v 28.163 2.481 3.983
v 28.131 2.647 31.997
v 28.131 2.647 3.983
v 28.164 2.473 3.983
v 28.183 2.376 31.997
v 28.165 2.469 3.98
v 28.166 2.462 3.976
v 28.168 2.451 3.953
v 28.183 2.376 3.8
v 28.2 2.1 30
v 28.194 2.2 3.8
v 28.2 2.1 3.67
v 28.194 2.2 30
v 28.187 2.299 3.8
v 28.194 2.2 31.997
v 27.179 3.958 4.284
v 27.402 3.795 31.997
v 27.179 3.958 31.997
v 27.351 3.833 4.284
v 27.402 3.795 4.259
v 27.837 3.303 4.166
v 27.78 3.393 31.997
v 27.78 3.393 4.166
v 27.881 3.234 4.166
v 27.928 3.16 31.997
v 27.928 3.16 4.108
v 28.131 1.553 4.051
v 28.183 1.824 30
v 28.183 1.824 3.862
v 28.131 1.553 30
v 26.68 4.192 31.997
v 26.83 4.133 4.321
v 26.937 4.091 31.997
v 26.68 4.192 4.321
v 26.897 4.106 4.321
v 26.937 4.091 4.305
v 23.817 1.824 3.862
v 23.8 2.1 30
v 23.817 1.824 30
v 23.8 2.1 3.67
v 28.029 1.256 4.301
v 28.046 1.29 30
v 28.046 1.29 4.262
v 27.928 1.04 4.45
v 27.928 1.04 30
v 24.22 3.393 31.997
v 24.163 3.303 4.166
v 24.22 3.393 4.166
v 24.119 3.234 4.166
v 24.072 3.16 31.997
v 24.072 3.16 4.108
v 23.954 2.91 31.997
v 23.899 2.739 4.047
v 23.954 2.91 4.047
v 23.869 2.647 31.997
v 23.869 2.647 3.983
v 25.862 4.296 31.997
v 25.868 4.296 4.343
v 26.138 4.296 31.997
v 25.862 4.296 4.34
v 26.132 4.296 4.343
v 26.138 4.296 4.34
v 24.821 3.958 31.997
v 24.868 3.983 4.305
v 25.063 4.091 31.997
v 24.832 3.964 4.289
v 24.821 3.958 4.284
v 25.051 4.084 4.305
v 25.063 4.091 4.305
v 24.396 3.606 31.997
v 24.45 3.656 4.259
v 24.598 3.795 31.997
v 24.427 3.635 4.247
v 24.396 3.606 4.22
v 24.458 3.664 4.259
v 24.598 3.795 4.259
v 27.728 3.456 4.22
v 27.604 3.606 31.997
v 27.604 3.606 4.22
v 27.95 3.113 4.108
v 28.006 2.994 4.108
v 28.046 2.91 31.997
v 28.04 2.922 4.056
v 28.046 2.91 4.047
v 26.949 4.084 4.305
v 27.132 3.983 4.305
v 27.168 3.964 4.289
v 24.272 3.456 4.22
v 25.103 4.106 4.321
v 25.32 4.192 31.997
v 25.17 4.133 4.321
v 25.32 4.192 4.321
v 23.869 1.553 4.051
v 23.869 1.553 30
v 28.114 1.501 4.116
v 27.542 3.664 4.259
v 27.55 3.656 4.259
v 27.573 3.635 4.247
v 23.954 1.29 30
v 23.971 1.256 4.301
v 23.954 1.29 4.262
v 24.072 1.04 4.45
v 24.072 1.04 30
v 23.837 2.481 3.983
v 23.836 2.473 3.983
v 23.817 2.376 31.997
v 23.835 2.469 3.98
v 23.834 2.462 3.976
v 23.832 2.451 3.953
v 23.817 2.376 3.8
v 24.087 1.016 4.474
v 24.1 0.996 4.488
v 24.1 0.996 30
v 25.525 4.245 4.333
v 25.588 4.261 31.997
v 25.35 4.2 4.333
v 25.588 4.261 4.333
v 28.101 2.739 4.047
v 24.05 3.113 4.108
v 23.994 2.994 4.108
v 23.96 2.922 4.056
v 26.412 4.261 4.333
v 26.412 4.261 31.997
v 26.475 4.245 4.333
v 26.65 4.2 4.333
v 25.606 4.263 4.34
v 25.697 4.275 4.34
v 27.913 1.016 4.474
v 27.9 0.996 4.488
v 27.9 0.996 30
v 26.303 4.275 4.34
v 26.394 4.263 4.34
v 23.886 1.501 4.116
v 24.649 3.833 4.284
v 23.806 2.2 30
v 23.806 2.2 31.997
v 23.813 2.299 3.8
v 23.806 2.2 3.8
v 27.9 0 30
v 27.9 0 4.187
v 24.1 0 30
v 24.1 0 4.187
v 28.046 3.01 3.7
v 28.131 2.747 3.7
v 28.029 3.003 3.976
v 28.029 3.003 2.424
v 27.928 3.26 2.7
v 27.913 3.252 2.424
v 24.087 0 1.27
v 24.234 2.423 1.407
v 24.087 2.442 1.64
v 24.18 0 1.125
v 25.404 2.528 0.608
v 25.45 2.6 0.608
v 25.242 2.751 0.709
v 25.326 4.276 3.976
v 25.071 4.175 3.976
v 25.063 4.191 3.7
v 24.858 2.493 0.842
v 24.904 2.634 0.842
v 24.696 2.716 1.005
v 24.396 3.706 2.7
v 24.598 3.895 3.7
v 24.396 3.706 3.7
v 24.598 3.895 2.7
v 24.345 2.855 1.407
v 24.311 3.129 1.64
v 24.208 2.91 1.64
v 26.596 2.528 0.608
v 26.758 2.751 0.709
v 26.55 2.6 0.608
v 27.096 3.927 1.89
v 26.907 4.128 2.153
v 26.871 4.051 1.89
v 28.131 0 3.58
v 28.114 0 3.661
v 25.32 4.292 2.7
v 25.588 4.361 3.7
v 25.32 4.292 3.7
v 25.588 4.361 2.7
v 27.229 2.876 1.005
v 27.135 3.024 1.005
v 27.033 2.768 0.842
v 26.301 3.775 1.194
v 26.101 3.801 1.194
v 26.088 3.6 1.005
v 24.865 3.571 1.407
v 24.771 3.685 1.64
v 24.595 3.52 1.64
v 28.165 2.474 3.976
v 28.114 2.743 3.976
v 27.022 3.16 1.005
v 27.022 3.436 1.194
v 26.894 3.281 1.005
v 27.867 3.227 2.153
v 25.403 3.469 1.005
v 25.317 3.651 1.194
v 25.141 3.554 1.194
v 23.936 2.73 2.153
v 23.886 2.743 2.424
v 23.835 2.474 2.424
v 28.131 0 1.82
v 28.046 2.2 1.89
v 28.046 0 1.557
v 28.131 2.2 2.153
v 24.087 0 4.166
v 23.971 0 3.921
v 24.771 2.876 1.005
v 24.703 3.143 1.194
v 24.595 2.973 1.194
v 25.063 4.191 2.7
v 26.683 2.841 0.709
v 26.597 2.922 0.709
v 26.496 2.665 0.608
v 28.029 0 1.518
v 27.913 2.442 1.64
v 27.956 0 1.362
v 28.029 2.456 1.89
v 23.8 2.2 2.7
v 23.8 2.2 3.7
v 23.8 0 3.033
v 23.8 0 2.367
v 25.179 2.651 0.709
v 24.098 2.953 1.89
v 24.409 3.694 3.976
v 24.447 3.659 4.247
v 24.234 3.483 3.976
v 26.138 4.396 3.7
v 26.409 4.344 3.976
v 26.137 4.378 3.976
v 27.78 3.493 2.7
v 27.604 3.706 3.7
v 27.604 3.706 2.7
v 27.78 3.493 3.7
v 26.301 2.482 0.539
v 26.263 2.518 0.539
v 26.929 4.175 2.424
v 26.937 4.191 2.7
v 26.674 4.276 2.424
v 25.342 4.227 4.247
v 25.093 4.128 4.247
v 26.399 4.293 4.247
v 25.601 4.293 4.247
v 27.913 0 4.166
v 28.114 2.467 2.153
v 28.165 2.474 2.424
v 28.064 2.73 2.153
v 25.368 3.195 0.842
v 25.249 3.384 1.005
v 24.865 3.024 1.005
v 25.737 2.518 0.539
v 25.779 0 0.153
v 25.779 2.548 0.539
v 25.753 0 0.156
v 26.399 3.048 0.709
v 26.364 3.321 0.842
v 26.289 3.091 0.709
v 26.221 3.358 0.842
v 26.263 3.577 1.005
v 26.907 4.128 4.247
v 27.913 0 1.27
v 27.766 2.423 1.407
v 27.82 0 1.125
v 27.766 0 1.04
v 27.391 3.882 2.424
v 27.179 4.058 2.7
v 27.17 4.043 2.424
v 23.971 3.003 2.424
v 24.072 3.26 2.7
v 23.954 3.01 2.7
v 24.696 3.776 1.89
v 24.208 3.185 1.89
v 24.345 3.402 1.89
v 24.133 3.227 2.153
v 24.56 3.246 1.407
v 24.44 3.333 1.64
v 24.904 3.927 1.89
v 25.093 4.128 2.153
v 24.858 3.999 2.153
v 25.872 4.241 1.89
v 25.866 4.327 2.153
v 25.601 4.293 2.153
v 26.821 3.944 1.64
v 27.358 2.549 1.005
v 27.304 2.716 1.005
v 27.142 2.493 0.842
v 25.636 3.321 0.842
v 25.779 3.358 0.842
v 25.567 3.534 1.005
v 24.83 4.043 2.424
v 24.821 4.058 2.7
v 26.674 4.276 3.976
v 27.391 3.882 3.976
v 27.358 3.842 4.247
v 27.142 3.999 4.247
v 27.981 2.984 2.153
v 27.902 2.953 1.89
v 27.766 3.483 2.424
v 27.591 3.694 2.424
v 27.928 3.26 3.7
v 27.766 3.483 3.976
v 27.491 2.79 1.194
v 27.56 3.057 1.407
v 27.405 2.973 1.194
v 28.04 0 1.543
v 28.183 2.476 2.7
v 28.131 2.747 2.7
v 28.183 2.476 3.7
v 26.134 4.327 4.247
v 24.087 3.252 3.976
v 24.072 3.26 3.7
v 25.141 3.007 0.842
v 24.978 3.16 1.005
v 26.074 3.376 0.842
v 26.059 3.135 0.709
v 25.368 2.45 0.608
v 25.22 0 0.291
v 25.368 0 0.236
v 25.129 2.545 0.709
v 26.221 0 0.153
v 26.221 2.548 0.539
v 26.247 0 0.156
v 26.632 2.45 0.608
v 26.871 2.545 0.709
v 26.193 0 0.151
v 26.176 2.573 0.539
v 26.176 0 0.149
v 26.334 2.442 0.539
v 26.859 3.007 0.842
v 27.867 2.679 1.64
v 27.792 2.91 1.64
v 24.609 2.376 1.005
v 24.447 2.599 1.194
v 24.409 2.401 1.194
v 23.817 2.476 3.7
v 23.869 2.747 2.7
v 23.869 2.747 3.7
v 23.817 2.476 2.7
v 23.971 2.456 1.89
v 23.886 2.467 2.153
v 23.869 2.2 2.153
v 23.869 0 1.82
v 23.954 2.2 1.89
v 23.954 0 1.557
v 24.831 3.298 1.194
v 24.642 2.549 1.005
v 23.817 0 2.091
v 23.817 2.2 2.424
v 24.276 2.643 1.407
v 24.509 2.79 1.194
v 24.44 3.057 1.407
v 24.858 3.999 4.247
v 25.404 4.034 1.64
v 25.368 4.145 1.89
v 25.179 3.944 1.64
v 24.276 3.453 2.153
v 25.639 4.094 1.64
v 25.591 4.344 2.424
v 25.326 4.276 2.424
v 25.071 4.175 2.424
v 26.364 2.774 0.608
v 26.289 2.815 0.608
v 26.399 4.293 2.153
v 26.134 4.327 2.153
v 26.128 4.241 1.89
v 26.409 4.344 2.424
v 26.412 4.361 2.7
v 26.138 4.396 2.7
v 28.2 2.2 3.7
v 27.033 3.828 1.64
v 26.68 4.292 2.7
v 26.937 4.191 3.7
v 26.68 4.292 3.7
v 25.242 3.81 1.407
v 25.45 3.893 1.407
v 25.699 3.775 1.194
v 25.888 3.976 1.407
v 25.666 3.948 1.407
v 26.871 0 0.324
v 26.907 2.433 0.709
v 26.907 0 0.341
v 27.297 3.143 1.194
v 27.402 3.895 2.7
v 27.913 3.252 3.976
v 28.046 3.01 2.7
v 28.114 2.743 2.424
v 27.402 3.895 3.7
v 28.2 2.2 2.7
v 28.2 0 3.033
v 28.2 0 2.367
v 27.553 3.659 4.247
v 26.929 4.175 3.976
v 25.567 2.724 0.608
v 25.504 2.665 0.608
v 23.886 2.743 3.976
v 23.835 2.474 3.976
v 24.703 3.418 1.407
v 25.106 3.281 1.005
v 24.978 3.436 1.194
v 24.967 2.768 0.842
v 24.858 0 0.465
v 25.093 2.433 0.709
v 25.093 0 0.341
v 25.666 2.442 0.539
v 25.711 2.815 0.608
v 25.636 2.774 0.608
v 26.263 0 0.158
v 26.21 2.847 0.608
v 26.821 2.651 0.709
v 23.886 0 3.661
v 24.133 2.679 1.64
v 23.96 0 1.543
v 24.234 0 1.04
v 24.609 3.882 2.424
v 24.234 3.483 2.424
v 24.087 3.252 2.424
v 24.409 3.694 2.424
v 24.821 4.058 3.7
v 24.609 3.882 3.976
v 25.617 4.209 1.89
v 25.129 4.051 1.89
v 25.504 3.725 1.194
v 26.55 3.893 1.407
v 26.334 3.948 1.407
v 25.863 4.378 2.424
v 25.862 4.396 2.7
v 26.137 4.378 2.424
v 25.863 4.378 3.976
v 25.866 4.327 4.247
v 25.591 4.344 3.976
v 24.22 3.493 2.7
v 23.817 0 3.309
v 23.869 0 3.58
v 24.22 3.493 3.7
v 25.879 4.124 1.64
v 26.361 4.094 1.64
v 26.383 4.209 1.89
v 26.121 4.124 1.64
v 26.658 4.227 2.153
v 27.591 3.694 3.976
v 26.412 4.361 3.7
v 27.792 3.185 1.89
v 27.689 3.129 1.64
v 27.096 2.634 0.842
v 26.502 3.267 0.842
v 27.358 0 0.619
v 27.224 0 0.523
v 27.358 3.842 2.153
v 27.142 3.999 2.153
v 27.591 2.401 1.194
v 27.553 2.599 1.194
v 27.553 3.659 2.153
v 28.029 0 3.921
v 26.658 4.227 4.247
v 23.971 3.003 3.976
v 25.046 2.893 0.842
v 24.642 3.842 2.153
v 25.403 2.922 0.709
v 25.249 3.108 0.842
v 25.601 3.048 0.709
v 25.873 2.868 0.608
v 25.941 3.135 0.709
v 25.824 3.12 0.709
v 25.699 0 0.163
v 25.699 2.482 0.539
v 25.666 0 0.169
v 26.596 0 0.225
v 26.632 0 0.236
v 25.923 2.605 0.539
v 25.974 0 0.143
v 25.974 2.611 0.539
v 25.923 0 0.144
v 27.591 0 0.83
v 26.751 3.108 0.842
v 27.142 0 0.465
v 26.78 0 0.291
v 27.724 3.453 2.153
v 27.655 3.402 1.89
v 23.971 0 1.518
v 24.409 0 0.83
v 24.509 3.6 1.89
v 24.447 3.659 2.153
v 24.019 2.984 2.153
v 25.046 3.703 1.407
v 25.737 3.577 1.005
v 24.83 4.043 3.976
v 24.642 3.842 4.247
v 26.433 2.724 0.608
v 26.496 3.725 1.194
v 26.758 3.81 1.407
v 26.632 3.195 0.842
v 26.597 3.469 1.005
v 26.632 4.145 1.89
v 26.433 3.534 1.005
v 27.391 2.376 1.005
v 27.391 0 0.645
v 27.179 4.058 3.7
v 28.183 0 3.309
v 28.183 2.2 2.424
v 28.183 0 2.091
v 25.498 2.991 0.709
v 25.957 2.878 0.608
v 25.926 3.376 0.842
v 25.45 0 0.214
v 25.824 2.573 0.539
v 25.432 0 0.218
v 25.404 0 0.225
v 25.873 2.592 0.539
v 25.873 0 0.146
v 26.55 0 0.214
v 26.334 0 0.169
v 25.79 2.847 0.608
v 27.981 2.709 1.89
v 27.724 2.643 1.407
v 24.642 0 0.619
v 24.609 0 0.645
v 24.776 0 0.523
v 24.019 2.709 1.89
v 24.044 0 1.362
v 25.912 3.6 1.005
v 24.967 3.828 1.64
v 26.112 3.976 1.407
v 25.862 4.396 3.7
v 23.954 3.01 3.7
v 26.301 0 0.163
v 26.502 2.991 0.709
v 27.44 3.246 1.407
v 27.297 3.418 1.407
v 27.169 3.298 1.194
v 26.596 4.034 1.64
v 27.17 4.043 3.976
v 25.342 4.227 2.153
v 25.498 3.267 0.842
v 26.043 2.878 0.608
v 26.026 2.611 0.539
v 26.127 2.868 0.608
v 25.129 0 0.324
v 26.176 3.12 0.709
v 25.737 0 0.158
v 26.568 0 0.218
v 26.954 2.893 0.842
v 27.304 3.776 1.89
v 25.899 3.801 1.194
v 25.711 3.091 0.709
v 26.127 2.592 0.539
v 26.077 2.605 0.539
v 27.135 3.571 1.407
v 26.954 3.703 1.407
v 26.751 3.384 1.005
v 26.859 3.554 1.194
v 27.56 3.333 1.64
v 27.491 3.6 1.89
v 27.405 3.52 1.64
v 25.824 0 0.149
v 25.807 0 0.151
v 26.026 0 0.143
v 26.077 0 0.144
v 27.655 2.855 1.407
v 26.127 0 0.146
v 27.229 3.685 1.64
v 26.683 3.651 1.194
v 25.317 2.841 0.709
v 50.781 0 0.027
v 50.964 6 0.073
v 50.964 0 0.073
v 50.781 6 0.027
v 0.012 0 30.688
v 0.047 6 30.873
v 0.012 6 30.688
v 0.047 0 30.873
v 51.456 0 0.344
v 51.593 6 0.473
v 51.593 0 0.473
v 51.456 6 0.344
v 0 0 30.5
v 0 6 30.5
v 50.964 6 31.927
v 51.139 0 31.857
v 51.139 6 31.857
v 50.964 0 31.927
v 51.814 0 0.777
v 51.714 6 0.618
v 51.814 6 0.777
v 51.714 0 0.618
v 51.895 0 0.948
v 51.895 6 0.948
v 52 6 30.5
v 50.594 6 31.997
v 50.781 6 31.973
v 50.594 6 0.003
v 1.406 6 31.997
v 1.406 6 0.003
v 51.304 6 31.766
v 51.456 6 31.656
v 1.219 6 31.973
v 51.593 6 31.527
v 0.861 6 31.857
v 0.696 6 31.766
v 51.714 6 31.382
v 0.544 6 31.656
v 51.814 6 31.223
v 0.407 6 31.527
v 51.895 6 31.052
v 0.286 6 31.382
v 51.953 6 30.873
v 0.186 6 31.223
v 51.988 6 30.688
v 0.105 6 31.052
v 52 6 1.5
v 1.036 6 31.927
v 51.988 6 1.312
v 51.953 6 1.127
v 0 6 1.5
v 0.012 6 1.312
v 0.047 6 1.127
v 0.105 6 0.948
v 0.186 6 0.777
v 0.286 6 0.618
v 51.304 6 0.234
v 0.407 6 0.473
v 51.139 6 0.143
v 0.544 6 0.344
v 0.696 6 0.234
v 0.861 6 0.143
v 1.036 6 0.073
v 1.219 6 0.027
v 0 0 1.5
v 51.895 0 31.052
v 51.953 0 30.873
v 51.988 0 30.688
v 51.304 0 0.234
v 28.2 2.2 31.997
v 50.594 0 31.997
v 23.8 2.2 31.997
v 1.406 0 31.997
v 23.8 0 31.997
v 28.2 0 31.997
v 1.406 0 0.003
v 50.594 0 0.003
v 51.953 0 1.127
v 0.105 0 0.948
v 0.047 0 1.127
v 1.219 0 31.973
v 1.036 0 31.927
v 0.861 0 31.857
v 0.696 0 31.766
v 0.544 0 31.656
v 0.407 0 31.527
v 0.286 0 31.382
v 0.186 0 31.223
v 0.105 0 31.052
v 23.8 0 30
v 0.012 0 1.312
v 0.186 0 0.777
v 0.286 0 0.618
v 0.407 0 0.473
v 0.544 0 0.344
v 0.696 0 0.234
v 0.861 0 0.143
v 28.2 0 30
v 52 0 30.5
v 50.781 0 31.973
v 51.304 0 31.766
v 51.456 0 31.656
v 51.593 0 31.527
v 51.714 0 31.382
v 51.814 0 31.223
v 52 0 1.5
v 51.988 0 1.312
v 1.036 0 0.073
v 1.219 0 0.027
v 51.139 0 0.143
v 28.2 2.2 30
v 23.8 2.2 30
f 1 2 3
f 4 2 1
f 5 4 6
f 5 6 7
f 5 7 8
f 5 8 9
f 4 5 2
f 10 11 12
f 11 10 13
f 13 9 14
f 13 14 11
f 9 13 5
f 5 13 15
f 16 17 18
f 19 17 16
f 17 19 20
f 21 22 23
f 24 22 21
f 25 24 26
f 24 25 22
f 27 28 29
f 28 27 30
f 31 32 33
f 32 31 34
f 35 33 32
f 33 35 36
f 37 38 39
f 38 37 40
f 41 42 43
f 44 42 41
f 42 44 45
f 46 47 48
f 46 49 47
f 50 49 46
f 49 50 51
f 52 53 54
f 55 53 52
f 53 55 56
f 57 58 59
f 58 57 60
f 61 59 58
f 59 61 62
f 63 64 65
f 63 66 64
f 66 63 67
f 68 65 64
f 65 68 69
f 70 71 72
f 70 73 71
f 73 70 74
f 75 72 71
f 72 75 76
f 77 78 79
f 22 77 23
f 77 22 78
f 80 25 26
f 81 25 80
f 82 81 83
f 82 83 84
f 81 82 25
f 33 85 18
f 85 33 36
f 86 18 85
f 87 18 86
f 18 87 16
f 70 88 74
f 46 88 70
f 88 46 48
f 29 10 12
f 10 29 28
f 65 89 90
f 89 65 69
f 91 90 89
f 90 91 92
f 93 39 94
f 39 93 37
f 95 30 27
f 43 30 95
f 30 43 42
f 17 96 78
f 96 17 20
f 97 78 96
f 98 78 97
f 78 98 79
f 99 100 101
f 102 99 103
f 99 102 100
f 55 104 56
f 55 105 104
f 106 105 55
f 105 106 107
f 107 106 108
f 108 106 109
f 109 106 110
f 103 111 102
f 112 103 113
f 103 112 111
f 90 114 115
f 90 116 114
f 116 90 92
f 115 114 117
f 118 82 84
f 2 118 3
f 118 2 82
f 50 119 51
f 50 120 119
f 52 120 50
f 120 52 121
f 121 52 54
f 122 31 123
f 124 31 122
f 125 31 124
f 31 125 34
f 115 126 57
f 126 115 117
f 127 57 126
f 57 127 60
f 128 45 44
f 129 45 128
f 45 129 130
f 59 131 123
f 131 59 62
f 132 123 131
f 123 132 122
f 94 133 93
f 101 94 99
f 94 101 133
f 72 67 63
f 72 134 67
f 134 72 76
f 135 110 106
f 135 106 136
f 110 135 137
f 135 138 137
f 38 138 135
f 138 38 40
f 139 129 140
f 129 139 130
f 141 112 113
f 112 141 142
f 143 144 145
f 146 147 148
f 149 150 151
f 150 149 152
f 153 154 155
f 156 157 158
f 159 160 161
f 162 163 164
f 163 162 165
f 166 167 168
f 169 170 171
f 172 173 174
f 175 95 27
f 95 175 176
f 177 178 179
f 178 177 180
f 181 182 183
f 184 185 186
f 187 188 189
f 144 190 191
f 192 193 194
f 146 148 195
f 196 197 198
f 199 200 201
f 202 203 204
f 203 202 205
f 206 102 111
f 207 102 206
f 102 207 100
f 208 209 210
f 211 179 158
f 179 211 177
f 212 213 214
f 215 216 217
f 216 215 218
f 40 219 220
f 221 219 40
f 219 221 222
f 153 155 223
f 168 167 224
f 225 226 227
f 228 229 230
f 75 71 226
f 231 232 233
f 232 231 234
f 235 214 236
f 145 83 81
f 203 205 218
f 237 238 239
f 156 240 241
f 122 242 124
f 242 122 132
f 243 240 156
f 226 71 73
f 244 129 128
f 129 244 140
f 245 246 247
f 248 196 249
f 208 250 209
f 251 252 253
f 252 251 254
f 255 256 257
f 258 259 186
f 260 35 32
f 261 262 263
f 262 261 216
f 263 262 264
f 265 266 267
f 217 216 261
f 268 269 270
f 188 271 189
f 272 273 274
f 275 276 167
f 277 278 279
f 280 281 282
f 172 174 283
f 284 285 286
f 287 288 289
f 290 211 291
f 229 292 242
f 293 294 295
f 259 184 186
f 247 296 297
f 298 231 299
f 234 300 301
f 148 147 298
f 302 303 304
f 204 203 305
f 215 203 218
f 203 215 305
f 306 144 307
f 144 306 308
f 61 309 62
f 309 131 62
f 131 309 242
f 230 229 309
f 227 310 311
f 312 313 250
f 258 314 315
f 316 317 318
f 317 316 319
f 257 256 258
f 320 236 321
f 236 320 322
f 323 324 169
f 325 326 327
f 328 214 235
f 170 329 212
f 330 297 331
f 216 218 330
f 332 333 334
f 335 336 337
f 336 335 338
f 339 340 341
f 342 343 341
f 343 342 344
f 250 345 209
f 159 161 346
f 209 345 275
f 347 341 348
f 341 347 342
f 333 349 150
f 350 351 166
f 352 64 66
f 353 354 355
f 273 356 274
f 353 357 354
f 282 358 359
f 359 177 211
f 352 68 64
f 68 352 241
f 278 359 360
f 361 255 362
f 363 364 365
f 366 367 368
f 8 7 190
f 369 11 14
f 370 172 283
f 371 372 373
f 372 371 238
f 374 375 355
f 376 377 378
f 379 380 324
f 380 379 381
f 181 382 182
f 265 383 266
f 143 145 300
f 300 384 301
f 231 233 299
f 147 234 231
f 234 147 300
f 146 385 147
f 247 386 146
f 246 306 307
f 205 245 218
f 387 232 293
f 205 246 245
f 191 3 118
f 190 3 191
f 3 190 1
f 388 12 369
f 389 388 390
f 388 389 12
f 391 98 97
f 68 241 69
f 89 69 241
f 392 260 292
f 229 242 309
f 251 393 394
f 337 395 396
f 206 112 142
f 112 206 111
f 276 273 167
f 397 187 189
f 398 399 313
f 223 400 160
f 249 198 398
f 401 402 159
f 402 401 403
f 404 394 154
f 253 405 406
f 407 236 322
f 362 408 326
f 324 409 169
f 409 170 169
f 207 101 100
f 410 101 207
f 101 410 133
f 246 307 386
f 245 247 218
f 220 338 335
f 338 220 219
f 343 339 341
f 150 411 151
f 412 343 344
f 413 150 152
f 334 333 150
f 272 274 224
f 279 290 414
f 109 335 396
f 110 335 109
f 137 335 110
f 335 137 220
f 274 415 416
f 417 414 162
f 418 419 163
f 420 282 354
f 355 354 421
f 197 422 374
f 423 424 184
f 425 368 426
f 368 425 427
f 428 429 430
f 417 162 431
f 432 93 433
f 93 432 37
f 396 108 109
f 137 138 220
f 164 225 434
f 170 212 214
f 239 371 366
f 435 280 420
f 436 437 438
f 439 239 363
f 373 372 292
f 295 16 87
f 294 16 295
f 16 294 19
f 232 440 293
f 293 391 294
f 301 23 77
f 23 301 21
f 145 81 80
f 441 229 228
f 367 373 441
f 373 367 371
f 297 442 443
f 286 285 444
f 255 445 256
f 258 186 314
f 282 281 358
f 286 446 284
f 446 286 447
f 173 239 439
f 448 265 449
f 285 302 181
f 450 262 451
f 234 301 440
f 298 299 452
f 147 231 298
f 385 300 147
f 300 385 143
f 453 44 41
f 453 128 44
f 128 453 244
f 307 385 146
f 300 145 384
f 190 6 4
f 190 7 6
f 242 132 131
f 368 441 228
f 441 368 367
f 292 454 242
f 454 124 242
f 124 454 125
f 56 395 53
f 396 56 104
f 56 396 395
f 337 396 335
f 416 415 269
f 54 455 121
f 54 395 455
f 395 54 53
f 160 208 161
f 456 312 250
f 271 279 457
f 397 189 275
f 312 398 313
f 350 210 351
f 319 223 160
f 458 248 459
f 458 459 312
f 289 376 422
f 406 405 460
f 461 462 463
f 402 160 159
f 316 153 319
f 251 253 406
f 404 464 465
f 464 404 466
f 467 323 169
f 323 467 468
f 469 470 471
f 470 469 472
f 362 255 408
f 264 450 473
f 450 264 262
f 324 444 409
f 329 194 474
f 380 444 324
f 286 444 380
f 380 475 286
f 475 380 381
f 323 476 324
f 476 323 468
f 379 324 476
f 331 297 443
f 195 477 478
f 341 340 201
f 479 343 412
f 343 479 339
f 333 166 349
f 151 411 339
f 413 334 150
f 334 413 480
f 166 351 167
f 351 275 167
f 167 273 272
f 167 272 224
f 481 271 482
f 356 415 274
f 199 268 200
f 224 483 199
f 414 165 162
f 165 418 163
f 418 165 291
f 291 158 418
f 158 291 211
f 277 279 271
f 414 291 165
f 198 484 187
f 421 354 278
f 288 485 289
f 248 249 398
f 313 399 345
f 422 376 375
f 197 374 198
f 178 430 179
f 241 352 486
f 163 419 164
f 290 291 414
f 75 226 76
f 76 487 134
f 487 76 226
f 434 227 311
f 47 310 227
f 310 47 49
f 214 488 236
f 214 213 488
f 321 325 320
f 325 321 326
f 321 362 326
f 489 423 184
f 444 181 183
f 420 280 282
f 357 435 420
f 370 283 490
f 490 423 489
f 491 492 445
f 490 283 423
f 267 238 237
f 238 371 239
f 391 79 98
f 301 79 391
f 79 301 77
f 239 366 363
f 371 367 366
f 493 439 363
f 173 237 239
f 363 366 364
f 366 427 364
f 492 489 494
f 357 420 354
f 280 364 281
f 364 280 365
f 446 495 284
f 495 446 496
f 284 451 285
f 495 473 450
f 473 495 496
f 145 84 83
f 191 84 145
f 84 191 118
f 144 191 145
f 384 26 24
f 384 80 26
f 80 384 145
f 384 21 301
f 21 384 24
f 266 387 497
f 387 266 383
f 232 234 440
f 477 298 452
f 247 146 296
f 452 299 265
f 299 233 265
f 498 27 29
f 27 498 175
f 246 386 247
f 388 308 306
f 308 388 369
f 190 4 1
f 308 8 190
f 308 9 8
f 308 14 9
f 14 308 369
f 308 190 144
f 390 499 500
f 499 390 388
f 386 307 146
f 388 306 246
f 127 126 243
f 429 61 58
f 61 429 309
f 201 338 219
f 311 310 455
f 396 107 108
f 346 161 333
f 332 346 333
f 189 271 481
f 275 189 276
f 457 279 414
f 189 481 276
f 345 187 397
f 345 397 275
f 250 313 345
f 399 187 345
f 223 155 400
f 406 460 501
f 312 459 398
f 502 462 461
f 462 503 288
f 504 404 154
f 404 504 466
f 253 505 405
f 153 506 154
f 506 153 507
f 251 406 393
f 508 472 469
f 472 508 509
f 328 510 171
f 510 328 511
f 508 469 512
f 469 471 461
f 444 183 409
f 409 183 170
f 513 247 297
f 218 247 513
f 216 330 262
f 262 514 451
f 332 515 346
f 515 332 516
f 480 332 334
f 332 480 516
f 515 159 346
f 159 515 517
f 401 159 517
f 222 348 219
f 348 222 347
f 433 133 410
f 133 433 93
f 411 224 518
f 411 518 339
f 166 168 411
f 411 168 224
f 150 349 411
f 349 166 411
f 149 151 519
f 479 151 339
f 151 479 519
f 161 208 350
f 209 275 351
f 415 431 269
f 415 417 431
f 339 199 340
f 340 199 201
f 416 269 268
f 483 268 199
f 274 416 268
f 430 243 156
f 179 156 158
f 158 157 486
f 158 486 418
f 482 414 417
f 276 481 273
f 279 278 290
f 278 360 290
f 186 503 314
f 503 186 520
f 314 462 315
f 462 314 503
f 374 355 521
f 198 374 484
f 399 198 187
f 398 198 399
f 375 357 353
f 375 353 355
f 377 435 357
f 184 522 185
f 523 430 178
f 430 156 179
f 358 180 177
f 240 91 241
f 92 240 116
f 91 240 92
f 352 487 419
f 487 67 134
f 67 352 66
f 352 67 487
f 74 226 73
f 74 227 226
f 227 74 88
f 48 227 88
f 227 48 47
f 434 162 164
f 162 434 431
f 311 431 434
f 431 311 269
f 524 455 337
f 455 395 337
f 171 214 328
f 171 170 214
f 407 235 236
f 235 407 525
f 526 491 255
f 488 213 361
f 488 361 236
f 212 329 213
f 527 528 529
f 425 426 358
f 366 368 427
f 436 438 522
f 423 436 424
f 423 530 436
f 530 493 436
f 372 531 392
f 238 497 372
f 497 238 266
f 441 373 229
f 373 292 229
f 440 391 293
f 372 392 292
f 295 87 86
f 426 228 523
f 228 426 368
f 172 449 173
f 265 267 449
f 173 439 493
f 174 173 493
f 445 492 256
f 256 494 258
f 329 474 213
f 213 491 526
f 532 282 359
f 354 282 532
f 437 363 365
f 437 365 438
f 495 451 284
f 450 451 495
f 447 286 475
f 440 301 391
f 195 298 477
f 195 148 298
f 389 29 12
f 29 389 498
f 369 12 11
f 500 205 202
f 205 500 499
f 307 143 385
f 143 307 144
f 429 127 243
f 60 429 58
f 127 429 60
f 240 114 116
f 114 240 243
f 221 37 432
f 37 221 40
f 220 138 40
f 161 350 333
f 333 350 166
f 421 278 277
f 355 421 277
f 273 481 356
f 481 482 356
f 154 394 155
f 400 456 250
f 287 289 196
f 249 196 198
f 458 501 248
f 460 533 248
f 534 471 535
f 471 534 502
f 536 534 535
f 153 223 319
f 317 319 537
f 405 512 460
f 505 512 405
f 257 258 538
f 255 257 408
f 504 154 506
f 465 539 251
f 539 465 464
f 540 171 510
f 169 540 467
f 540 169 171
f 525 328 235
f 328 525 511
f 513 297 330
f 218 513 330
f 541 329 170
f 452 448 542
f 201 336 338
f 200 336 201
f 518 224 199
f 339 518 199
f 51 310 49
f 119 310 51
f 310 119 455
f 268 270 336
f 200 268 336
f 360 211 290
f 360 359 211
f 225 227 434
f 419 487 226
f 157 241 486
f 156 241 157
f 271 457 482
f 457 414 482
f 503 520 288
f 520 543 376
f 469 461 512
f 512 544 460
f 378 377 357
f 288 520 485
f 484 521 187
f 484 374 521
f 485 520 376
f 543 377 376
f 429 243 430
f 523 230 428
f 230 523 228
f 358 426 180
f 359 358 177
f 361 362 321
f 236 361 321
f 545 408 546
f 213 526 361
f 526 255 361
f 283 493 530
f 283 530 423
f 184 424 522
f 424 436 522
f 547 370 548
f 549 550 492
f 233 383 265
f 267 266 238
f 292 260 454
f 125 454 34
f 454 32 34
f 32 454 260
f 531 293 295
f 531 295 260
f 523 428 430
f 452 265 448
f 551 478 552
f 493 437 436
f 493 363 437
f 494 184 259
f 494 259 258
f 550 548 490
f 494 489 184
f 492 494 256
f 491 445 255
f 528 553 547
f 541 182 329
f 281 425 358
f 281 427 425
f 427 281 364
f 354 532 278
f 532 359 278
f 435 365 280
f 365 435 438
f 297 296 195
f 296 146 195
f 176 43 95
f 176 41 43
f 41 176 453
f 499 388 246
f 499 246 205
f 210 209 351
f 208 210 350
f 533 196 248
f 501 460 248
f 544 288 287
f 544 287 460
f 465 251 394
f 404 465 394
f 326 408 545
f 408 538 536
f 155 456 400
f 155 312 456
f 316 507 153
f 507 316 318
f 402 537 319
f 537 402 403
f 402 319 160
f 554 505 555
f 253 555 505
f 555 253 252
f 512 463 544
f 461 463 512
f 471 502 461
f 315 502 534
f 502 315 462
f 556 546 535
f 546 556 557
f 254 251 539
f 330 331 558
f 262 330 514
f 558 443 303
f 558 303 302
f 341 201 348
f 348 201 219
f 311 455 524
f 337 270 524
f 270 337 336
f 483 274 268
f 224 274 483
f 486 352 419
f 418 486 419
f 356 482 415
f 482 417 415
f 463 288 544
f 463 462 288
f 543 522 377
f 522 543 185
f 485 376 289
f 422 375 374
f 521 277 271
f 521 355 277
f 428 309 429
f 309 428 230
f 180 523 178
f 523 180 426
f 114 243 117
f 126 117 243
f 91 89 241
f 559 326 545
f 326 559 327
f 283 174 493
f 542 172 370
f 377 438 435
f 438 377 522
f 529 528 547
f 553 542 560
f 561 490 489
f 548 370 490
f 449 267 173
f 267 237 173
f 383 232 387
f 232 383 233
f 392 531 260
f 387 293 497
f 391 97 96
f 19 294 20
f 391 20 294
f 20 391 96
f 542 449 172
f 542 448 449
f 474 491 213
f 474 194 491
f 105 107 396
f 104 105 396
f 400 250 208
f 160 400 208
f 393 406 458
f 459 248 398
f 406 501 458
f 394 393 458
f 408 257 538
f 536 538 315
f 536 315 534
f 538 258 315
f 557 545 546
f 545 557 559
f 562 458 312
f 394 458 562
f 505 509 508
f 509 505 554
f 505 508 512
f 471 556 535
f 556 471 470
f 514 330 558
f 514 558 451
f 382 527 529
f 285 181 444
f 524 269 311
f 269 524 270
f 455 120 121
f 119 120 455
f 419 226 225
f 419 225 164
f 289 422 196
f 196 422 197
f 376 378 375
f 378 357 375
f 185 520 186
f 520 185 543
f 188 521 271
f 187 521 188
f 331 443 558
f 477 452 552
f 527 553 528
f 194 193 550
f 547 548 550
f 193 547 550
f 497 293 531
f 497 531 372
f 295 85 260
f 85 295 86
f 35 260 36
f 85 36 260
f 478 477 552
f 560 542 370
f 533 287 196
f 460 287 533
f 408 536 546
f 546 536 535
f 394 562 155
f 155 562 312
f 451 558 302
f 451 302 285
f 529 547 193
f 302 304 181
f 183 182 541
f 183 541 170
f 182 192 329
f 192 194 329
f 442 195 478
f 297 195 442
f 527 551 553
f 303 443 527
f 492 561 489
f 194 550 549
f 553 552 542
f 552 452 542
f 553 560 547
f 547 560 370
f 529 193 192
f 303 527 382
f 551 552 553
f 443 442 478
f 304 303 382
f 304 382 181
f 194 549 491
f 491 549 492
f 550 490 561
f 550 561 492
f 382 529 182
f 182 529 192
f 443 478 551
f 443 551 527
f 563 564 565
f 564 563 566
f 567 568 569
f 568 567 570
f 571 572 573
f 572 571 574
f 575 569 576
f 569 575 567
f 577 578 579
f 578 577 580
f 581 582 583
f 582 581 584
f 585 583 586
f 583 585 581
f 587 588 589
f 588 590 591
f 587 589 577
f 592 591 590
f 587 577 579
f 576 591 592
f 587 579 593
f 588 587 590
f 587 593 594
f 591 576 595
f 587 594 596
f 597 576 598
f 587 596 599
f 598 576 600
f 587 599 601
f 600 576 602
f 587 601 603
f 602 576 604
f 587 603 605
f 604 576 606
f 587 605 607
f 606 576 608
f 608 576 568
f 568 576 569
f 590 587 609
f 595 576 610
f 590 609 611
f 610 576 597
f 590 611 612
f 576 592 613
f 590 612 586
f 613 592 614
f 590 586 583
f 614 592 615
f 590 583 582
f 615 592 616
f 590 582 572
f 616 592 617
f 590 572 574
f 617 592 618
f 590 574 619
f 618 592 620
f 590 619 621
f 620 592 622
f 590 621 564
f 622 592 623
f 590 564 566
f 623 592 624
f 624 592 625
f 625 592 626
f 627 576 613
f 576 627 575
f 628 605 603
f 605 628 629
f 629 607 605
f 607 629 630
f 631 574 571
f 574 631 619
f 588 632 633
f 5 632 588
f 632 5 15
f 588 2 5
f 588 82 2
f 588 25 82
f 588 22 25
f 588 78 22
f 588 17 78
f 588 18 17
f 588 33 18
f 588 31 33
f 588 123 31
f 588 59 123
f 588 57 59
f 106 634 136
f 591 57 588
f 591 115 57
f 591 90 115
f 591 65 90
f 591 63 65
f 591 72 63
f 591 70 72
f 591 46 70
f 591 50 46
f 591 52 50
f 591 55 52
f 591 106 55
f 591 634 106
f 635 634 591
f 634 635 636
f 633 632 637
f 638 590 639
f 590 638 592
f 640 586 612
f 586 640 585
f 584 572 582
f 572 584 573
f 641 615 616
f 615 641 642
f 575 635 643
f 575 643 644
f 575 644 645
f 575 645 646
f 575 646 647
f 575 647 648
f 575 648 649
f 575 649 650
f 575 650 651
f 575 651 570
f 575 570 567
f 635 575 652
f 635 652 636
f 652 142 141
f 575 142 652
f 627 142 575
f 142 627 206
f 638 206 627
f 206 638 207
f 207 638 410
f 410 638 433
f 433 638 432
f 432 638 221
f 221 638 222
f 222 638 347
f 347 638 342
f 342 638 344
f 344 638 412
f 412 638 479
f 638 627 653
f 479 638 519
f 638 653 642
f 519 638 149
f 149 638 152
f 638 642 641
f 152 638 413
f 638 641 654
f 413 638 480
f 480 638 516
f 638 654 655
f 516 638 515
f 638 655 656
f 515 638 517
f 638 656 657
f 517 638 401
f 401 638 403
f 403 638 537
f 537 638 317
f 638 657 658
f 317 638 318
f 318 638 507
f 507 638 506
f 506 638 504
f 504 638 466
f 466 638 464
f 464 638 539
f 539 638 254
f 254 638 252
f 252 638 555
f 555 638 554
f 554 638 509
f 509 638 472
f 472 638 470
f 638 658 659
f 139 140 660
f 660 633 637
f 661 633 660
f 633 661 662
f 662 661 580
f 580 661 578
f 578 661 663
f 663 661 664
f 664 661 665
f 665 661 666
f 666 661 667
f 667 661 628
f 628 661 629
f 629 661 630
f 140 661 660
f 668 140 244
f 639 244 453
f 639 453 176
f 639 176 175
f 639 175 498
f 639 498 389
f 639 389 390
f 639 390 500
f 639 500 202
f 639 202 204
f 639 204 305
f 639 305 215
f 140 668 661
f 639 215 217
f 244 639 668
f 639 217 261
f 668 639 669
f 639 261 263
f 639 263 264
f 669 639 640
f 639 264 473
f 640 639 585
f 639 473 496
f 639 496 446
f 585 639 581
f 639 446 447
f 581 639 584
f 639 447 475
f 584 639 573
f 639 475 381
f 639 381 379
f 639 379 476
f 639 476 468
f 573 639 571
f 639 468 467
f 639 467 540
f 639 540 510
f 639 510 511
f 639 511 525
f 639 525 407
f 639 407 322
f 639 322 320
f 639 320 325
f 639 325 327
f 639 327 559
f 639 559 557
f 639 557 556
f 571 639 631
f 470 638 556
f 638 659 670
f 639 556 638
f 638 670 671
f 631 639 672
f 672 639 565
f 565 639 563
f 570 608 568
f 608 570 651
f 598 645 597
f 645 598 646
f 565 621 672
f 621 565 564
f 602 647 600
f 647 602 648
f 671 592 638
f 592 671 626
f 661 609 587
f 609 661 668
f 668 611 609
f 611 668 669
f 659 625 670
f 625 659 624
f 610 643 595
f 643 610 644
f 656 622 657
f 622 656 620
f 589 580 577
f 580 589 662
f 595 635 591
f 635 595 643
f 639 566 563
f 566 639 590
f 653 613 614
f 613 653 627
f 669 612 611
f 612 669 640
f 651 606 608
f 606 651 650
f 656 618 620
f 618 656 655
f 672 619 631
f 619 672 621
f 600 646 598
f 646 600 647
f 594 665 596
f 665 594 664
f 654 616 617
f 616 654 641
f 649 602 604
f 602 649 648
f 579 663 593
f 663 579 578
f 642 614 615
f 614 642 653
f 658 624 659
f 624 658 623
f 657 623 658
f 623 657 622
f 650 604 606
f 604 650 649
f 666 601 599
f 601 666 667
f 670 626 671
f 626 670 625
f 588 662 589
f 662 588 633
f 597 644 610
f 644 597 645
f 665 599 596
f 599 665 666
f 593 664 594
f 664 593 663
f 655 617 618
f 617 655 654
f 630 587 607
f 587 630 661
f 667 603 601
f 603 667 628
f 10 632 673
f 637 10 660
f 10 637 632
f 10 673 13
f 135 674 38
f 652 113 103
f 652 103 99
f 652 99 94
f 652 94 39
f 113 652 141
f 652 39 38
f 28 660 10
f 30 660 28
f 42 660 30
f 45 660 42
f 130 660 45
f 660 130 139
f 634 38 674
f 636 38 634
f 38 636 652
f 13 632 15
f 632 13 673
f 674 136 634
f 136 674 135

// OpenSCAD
// SKADIS large hook label

// Recommend adding 2 mm to label width
Width = 52;
// Recommend adding 2 mm to label height
Height = 32;
// Corner radius
Radius = 1.5;
// Thickness in addition to the wire size
Thickness = 1;
// Thickness of the IKEA wire clip
WireDia = 4.4;
// Clip overlap determines how tight it is to push the clip on
ClipOverlap = 0.6;

$fn = 50;

assert(Radius < Width/2);
assert(Radius < Height/2);

t = Thickness + WireDia + ClipOverlap;


difference() {
  // Plate
  if (Radius < 0.1) {
    cube([Width, t, Height]);
  } else {
    translate([0,t,0]) rotate([90,0,0]) hull() {
      translate([Radius, Radius, 0]) cylinder(r=Radius, h=t);
      translate([Width-Radius, Radius, 0]) cylinder(r=Radius, h=t);
      translate([Width-Radius, Height-Radius, 0]) cylinder(r=Radius, h=t);
      translate([Radius, Height-Radius, 0]) cylinder(r=Radius, h=t);
    }
  }
  translate([0,0,0.5]) { // Push down from top
    // Main Wire
    translate([Width/2,WireDia/2 - 0.1, WireDia/2]) cylinder(d=WireDia, h=Height);
    w = WireDia - ClipOverlap;
    // Cutout to let wire push in
    translate([Width/2 - w/2, -WireDia/2, WireDia/2]) cube([w, WireDia, Height+2]);
    // Wider part to let top of clip fit
    hull() {
      translate([Width/2,WireDia/2,WireDia/2]) sphere(WireDia/2);
      translate([Width/2,-WireDia,WireDia/2-1]) sphere(WireDia/2);
      // Enlongated to allow for the internal radius
      translate([Width/2,WireDia/2,WireDia/2+1]) sphere(WireDia/2);
    }
  }
  // Bottom cut for the locating pin whish is 30 mm from the top
  translate([Width/2 - WireDia/2, -WireDia/2, 30]) cube([WireDia, WireDia, Height]);
}
